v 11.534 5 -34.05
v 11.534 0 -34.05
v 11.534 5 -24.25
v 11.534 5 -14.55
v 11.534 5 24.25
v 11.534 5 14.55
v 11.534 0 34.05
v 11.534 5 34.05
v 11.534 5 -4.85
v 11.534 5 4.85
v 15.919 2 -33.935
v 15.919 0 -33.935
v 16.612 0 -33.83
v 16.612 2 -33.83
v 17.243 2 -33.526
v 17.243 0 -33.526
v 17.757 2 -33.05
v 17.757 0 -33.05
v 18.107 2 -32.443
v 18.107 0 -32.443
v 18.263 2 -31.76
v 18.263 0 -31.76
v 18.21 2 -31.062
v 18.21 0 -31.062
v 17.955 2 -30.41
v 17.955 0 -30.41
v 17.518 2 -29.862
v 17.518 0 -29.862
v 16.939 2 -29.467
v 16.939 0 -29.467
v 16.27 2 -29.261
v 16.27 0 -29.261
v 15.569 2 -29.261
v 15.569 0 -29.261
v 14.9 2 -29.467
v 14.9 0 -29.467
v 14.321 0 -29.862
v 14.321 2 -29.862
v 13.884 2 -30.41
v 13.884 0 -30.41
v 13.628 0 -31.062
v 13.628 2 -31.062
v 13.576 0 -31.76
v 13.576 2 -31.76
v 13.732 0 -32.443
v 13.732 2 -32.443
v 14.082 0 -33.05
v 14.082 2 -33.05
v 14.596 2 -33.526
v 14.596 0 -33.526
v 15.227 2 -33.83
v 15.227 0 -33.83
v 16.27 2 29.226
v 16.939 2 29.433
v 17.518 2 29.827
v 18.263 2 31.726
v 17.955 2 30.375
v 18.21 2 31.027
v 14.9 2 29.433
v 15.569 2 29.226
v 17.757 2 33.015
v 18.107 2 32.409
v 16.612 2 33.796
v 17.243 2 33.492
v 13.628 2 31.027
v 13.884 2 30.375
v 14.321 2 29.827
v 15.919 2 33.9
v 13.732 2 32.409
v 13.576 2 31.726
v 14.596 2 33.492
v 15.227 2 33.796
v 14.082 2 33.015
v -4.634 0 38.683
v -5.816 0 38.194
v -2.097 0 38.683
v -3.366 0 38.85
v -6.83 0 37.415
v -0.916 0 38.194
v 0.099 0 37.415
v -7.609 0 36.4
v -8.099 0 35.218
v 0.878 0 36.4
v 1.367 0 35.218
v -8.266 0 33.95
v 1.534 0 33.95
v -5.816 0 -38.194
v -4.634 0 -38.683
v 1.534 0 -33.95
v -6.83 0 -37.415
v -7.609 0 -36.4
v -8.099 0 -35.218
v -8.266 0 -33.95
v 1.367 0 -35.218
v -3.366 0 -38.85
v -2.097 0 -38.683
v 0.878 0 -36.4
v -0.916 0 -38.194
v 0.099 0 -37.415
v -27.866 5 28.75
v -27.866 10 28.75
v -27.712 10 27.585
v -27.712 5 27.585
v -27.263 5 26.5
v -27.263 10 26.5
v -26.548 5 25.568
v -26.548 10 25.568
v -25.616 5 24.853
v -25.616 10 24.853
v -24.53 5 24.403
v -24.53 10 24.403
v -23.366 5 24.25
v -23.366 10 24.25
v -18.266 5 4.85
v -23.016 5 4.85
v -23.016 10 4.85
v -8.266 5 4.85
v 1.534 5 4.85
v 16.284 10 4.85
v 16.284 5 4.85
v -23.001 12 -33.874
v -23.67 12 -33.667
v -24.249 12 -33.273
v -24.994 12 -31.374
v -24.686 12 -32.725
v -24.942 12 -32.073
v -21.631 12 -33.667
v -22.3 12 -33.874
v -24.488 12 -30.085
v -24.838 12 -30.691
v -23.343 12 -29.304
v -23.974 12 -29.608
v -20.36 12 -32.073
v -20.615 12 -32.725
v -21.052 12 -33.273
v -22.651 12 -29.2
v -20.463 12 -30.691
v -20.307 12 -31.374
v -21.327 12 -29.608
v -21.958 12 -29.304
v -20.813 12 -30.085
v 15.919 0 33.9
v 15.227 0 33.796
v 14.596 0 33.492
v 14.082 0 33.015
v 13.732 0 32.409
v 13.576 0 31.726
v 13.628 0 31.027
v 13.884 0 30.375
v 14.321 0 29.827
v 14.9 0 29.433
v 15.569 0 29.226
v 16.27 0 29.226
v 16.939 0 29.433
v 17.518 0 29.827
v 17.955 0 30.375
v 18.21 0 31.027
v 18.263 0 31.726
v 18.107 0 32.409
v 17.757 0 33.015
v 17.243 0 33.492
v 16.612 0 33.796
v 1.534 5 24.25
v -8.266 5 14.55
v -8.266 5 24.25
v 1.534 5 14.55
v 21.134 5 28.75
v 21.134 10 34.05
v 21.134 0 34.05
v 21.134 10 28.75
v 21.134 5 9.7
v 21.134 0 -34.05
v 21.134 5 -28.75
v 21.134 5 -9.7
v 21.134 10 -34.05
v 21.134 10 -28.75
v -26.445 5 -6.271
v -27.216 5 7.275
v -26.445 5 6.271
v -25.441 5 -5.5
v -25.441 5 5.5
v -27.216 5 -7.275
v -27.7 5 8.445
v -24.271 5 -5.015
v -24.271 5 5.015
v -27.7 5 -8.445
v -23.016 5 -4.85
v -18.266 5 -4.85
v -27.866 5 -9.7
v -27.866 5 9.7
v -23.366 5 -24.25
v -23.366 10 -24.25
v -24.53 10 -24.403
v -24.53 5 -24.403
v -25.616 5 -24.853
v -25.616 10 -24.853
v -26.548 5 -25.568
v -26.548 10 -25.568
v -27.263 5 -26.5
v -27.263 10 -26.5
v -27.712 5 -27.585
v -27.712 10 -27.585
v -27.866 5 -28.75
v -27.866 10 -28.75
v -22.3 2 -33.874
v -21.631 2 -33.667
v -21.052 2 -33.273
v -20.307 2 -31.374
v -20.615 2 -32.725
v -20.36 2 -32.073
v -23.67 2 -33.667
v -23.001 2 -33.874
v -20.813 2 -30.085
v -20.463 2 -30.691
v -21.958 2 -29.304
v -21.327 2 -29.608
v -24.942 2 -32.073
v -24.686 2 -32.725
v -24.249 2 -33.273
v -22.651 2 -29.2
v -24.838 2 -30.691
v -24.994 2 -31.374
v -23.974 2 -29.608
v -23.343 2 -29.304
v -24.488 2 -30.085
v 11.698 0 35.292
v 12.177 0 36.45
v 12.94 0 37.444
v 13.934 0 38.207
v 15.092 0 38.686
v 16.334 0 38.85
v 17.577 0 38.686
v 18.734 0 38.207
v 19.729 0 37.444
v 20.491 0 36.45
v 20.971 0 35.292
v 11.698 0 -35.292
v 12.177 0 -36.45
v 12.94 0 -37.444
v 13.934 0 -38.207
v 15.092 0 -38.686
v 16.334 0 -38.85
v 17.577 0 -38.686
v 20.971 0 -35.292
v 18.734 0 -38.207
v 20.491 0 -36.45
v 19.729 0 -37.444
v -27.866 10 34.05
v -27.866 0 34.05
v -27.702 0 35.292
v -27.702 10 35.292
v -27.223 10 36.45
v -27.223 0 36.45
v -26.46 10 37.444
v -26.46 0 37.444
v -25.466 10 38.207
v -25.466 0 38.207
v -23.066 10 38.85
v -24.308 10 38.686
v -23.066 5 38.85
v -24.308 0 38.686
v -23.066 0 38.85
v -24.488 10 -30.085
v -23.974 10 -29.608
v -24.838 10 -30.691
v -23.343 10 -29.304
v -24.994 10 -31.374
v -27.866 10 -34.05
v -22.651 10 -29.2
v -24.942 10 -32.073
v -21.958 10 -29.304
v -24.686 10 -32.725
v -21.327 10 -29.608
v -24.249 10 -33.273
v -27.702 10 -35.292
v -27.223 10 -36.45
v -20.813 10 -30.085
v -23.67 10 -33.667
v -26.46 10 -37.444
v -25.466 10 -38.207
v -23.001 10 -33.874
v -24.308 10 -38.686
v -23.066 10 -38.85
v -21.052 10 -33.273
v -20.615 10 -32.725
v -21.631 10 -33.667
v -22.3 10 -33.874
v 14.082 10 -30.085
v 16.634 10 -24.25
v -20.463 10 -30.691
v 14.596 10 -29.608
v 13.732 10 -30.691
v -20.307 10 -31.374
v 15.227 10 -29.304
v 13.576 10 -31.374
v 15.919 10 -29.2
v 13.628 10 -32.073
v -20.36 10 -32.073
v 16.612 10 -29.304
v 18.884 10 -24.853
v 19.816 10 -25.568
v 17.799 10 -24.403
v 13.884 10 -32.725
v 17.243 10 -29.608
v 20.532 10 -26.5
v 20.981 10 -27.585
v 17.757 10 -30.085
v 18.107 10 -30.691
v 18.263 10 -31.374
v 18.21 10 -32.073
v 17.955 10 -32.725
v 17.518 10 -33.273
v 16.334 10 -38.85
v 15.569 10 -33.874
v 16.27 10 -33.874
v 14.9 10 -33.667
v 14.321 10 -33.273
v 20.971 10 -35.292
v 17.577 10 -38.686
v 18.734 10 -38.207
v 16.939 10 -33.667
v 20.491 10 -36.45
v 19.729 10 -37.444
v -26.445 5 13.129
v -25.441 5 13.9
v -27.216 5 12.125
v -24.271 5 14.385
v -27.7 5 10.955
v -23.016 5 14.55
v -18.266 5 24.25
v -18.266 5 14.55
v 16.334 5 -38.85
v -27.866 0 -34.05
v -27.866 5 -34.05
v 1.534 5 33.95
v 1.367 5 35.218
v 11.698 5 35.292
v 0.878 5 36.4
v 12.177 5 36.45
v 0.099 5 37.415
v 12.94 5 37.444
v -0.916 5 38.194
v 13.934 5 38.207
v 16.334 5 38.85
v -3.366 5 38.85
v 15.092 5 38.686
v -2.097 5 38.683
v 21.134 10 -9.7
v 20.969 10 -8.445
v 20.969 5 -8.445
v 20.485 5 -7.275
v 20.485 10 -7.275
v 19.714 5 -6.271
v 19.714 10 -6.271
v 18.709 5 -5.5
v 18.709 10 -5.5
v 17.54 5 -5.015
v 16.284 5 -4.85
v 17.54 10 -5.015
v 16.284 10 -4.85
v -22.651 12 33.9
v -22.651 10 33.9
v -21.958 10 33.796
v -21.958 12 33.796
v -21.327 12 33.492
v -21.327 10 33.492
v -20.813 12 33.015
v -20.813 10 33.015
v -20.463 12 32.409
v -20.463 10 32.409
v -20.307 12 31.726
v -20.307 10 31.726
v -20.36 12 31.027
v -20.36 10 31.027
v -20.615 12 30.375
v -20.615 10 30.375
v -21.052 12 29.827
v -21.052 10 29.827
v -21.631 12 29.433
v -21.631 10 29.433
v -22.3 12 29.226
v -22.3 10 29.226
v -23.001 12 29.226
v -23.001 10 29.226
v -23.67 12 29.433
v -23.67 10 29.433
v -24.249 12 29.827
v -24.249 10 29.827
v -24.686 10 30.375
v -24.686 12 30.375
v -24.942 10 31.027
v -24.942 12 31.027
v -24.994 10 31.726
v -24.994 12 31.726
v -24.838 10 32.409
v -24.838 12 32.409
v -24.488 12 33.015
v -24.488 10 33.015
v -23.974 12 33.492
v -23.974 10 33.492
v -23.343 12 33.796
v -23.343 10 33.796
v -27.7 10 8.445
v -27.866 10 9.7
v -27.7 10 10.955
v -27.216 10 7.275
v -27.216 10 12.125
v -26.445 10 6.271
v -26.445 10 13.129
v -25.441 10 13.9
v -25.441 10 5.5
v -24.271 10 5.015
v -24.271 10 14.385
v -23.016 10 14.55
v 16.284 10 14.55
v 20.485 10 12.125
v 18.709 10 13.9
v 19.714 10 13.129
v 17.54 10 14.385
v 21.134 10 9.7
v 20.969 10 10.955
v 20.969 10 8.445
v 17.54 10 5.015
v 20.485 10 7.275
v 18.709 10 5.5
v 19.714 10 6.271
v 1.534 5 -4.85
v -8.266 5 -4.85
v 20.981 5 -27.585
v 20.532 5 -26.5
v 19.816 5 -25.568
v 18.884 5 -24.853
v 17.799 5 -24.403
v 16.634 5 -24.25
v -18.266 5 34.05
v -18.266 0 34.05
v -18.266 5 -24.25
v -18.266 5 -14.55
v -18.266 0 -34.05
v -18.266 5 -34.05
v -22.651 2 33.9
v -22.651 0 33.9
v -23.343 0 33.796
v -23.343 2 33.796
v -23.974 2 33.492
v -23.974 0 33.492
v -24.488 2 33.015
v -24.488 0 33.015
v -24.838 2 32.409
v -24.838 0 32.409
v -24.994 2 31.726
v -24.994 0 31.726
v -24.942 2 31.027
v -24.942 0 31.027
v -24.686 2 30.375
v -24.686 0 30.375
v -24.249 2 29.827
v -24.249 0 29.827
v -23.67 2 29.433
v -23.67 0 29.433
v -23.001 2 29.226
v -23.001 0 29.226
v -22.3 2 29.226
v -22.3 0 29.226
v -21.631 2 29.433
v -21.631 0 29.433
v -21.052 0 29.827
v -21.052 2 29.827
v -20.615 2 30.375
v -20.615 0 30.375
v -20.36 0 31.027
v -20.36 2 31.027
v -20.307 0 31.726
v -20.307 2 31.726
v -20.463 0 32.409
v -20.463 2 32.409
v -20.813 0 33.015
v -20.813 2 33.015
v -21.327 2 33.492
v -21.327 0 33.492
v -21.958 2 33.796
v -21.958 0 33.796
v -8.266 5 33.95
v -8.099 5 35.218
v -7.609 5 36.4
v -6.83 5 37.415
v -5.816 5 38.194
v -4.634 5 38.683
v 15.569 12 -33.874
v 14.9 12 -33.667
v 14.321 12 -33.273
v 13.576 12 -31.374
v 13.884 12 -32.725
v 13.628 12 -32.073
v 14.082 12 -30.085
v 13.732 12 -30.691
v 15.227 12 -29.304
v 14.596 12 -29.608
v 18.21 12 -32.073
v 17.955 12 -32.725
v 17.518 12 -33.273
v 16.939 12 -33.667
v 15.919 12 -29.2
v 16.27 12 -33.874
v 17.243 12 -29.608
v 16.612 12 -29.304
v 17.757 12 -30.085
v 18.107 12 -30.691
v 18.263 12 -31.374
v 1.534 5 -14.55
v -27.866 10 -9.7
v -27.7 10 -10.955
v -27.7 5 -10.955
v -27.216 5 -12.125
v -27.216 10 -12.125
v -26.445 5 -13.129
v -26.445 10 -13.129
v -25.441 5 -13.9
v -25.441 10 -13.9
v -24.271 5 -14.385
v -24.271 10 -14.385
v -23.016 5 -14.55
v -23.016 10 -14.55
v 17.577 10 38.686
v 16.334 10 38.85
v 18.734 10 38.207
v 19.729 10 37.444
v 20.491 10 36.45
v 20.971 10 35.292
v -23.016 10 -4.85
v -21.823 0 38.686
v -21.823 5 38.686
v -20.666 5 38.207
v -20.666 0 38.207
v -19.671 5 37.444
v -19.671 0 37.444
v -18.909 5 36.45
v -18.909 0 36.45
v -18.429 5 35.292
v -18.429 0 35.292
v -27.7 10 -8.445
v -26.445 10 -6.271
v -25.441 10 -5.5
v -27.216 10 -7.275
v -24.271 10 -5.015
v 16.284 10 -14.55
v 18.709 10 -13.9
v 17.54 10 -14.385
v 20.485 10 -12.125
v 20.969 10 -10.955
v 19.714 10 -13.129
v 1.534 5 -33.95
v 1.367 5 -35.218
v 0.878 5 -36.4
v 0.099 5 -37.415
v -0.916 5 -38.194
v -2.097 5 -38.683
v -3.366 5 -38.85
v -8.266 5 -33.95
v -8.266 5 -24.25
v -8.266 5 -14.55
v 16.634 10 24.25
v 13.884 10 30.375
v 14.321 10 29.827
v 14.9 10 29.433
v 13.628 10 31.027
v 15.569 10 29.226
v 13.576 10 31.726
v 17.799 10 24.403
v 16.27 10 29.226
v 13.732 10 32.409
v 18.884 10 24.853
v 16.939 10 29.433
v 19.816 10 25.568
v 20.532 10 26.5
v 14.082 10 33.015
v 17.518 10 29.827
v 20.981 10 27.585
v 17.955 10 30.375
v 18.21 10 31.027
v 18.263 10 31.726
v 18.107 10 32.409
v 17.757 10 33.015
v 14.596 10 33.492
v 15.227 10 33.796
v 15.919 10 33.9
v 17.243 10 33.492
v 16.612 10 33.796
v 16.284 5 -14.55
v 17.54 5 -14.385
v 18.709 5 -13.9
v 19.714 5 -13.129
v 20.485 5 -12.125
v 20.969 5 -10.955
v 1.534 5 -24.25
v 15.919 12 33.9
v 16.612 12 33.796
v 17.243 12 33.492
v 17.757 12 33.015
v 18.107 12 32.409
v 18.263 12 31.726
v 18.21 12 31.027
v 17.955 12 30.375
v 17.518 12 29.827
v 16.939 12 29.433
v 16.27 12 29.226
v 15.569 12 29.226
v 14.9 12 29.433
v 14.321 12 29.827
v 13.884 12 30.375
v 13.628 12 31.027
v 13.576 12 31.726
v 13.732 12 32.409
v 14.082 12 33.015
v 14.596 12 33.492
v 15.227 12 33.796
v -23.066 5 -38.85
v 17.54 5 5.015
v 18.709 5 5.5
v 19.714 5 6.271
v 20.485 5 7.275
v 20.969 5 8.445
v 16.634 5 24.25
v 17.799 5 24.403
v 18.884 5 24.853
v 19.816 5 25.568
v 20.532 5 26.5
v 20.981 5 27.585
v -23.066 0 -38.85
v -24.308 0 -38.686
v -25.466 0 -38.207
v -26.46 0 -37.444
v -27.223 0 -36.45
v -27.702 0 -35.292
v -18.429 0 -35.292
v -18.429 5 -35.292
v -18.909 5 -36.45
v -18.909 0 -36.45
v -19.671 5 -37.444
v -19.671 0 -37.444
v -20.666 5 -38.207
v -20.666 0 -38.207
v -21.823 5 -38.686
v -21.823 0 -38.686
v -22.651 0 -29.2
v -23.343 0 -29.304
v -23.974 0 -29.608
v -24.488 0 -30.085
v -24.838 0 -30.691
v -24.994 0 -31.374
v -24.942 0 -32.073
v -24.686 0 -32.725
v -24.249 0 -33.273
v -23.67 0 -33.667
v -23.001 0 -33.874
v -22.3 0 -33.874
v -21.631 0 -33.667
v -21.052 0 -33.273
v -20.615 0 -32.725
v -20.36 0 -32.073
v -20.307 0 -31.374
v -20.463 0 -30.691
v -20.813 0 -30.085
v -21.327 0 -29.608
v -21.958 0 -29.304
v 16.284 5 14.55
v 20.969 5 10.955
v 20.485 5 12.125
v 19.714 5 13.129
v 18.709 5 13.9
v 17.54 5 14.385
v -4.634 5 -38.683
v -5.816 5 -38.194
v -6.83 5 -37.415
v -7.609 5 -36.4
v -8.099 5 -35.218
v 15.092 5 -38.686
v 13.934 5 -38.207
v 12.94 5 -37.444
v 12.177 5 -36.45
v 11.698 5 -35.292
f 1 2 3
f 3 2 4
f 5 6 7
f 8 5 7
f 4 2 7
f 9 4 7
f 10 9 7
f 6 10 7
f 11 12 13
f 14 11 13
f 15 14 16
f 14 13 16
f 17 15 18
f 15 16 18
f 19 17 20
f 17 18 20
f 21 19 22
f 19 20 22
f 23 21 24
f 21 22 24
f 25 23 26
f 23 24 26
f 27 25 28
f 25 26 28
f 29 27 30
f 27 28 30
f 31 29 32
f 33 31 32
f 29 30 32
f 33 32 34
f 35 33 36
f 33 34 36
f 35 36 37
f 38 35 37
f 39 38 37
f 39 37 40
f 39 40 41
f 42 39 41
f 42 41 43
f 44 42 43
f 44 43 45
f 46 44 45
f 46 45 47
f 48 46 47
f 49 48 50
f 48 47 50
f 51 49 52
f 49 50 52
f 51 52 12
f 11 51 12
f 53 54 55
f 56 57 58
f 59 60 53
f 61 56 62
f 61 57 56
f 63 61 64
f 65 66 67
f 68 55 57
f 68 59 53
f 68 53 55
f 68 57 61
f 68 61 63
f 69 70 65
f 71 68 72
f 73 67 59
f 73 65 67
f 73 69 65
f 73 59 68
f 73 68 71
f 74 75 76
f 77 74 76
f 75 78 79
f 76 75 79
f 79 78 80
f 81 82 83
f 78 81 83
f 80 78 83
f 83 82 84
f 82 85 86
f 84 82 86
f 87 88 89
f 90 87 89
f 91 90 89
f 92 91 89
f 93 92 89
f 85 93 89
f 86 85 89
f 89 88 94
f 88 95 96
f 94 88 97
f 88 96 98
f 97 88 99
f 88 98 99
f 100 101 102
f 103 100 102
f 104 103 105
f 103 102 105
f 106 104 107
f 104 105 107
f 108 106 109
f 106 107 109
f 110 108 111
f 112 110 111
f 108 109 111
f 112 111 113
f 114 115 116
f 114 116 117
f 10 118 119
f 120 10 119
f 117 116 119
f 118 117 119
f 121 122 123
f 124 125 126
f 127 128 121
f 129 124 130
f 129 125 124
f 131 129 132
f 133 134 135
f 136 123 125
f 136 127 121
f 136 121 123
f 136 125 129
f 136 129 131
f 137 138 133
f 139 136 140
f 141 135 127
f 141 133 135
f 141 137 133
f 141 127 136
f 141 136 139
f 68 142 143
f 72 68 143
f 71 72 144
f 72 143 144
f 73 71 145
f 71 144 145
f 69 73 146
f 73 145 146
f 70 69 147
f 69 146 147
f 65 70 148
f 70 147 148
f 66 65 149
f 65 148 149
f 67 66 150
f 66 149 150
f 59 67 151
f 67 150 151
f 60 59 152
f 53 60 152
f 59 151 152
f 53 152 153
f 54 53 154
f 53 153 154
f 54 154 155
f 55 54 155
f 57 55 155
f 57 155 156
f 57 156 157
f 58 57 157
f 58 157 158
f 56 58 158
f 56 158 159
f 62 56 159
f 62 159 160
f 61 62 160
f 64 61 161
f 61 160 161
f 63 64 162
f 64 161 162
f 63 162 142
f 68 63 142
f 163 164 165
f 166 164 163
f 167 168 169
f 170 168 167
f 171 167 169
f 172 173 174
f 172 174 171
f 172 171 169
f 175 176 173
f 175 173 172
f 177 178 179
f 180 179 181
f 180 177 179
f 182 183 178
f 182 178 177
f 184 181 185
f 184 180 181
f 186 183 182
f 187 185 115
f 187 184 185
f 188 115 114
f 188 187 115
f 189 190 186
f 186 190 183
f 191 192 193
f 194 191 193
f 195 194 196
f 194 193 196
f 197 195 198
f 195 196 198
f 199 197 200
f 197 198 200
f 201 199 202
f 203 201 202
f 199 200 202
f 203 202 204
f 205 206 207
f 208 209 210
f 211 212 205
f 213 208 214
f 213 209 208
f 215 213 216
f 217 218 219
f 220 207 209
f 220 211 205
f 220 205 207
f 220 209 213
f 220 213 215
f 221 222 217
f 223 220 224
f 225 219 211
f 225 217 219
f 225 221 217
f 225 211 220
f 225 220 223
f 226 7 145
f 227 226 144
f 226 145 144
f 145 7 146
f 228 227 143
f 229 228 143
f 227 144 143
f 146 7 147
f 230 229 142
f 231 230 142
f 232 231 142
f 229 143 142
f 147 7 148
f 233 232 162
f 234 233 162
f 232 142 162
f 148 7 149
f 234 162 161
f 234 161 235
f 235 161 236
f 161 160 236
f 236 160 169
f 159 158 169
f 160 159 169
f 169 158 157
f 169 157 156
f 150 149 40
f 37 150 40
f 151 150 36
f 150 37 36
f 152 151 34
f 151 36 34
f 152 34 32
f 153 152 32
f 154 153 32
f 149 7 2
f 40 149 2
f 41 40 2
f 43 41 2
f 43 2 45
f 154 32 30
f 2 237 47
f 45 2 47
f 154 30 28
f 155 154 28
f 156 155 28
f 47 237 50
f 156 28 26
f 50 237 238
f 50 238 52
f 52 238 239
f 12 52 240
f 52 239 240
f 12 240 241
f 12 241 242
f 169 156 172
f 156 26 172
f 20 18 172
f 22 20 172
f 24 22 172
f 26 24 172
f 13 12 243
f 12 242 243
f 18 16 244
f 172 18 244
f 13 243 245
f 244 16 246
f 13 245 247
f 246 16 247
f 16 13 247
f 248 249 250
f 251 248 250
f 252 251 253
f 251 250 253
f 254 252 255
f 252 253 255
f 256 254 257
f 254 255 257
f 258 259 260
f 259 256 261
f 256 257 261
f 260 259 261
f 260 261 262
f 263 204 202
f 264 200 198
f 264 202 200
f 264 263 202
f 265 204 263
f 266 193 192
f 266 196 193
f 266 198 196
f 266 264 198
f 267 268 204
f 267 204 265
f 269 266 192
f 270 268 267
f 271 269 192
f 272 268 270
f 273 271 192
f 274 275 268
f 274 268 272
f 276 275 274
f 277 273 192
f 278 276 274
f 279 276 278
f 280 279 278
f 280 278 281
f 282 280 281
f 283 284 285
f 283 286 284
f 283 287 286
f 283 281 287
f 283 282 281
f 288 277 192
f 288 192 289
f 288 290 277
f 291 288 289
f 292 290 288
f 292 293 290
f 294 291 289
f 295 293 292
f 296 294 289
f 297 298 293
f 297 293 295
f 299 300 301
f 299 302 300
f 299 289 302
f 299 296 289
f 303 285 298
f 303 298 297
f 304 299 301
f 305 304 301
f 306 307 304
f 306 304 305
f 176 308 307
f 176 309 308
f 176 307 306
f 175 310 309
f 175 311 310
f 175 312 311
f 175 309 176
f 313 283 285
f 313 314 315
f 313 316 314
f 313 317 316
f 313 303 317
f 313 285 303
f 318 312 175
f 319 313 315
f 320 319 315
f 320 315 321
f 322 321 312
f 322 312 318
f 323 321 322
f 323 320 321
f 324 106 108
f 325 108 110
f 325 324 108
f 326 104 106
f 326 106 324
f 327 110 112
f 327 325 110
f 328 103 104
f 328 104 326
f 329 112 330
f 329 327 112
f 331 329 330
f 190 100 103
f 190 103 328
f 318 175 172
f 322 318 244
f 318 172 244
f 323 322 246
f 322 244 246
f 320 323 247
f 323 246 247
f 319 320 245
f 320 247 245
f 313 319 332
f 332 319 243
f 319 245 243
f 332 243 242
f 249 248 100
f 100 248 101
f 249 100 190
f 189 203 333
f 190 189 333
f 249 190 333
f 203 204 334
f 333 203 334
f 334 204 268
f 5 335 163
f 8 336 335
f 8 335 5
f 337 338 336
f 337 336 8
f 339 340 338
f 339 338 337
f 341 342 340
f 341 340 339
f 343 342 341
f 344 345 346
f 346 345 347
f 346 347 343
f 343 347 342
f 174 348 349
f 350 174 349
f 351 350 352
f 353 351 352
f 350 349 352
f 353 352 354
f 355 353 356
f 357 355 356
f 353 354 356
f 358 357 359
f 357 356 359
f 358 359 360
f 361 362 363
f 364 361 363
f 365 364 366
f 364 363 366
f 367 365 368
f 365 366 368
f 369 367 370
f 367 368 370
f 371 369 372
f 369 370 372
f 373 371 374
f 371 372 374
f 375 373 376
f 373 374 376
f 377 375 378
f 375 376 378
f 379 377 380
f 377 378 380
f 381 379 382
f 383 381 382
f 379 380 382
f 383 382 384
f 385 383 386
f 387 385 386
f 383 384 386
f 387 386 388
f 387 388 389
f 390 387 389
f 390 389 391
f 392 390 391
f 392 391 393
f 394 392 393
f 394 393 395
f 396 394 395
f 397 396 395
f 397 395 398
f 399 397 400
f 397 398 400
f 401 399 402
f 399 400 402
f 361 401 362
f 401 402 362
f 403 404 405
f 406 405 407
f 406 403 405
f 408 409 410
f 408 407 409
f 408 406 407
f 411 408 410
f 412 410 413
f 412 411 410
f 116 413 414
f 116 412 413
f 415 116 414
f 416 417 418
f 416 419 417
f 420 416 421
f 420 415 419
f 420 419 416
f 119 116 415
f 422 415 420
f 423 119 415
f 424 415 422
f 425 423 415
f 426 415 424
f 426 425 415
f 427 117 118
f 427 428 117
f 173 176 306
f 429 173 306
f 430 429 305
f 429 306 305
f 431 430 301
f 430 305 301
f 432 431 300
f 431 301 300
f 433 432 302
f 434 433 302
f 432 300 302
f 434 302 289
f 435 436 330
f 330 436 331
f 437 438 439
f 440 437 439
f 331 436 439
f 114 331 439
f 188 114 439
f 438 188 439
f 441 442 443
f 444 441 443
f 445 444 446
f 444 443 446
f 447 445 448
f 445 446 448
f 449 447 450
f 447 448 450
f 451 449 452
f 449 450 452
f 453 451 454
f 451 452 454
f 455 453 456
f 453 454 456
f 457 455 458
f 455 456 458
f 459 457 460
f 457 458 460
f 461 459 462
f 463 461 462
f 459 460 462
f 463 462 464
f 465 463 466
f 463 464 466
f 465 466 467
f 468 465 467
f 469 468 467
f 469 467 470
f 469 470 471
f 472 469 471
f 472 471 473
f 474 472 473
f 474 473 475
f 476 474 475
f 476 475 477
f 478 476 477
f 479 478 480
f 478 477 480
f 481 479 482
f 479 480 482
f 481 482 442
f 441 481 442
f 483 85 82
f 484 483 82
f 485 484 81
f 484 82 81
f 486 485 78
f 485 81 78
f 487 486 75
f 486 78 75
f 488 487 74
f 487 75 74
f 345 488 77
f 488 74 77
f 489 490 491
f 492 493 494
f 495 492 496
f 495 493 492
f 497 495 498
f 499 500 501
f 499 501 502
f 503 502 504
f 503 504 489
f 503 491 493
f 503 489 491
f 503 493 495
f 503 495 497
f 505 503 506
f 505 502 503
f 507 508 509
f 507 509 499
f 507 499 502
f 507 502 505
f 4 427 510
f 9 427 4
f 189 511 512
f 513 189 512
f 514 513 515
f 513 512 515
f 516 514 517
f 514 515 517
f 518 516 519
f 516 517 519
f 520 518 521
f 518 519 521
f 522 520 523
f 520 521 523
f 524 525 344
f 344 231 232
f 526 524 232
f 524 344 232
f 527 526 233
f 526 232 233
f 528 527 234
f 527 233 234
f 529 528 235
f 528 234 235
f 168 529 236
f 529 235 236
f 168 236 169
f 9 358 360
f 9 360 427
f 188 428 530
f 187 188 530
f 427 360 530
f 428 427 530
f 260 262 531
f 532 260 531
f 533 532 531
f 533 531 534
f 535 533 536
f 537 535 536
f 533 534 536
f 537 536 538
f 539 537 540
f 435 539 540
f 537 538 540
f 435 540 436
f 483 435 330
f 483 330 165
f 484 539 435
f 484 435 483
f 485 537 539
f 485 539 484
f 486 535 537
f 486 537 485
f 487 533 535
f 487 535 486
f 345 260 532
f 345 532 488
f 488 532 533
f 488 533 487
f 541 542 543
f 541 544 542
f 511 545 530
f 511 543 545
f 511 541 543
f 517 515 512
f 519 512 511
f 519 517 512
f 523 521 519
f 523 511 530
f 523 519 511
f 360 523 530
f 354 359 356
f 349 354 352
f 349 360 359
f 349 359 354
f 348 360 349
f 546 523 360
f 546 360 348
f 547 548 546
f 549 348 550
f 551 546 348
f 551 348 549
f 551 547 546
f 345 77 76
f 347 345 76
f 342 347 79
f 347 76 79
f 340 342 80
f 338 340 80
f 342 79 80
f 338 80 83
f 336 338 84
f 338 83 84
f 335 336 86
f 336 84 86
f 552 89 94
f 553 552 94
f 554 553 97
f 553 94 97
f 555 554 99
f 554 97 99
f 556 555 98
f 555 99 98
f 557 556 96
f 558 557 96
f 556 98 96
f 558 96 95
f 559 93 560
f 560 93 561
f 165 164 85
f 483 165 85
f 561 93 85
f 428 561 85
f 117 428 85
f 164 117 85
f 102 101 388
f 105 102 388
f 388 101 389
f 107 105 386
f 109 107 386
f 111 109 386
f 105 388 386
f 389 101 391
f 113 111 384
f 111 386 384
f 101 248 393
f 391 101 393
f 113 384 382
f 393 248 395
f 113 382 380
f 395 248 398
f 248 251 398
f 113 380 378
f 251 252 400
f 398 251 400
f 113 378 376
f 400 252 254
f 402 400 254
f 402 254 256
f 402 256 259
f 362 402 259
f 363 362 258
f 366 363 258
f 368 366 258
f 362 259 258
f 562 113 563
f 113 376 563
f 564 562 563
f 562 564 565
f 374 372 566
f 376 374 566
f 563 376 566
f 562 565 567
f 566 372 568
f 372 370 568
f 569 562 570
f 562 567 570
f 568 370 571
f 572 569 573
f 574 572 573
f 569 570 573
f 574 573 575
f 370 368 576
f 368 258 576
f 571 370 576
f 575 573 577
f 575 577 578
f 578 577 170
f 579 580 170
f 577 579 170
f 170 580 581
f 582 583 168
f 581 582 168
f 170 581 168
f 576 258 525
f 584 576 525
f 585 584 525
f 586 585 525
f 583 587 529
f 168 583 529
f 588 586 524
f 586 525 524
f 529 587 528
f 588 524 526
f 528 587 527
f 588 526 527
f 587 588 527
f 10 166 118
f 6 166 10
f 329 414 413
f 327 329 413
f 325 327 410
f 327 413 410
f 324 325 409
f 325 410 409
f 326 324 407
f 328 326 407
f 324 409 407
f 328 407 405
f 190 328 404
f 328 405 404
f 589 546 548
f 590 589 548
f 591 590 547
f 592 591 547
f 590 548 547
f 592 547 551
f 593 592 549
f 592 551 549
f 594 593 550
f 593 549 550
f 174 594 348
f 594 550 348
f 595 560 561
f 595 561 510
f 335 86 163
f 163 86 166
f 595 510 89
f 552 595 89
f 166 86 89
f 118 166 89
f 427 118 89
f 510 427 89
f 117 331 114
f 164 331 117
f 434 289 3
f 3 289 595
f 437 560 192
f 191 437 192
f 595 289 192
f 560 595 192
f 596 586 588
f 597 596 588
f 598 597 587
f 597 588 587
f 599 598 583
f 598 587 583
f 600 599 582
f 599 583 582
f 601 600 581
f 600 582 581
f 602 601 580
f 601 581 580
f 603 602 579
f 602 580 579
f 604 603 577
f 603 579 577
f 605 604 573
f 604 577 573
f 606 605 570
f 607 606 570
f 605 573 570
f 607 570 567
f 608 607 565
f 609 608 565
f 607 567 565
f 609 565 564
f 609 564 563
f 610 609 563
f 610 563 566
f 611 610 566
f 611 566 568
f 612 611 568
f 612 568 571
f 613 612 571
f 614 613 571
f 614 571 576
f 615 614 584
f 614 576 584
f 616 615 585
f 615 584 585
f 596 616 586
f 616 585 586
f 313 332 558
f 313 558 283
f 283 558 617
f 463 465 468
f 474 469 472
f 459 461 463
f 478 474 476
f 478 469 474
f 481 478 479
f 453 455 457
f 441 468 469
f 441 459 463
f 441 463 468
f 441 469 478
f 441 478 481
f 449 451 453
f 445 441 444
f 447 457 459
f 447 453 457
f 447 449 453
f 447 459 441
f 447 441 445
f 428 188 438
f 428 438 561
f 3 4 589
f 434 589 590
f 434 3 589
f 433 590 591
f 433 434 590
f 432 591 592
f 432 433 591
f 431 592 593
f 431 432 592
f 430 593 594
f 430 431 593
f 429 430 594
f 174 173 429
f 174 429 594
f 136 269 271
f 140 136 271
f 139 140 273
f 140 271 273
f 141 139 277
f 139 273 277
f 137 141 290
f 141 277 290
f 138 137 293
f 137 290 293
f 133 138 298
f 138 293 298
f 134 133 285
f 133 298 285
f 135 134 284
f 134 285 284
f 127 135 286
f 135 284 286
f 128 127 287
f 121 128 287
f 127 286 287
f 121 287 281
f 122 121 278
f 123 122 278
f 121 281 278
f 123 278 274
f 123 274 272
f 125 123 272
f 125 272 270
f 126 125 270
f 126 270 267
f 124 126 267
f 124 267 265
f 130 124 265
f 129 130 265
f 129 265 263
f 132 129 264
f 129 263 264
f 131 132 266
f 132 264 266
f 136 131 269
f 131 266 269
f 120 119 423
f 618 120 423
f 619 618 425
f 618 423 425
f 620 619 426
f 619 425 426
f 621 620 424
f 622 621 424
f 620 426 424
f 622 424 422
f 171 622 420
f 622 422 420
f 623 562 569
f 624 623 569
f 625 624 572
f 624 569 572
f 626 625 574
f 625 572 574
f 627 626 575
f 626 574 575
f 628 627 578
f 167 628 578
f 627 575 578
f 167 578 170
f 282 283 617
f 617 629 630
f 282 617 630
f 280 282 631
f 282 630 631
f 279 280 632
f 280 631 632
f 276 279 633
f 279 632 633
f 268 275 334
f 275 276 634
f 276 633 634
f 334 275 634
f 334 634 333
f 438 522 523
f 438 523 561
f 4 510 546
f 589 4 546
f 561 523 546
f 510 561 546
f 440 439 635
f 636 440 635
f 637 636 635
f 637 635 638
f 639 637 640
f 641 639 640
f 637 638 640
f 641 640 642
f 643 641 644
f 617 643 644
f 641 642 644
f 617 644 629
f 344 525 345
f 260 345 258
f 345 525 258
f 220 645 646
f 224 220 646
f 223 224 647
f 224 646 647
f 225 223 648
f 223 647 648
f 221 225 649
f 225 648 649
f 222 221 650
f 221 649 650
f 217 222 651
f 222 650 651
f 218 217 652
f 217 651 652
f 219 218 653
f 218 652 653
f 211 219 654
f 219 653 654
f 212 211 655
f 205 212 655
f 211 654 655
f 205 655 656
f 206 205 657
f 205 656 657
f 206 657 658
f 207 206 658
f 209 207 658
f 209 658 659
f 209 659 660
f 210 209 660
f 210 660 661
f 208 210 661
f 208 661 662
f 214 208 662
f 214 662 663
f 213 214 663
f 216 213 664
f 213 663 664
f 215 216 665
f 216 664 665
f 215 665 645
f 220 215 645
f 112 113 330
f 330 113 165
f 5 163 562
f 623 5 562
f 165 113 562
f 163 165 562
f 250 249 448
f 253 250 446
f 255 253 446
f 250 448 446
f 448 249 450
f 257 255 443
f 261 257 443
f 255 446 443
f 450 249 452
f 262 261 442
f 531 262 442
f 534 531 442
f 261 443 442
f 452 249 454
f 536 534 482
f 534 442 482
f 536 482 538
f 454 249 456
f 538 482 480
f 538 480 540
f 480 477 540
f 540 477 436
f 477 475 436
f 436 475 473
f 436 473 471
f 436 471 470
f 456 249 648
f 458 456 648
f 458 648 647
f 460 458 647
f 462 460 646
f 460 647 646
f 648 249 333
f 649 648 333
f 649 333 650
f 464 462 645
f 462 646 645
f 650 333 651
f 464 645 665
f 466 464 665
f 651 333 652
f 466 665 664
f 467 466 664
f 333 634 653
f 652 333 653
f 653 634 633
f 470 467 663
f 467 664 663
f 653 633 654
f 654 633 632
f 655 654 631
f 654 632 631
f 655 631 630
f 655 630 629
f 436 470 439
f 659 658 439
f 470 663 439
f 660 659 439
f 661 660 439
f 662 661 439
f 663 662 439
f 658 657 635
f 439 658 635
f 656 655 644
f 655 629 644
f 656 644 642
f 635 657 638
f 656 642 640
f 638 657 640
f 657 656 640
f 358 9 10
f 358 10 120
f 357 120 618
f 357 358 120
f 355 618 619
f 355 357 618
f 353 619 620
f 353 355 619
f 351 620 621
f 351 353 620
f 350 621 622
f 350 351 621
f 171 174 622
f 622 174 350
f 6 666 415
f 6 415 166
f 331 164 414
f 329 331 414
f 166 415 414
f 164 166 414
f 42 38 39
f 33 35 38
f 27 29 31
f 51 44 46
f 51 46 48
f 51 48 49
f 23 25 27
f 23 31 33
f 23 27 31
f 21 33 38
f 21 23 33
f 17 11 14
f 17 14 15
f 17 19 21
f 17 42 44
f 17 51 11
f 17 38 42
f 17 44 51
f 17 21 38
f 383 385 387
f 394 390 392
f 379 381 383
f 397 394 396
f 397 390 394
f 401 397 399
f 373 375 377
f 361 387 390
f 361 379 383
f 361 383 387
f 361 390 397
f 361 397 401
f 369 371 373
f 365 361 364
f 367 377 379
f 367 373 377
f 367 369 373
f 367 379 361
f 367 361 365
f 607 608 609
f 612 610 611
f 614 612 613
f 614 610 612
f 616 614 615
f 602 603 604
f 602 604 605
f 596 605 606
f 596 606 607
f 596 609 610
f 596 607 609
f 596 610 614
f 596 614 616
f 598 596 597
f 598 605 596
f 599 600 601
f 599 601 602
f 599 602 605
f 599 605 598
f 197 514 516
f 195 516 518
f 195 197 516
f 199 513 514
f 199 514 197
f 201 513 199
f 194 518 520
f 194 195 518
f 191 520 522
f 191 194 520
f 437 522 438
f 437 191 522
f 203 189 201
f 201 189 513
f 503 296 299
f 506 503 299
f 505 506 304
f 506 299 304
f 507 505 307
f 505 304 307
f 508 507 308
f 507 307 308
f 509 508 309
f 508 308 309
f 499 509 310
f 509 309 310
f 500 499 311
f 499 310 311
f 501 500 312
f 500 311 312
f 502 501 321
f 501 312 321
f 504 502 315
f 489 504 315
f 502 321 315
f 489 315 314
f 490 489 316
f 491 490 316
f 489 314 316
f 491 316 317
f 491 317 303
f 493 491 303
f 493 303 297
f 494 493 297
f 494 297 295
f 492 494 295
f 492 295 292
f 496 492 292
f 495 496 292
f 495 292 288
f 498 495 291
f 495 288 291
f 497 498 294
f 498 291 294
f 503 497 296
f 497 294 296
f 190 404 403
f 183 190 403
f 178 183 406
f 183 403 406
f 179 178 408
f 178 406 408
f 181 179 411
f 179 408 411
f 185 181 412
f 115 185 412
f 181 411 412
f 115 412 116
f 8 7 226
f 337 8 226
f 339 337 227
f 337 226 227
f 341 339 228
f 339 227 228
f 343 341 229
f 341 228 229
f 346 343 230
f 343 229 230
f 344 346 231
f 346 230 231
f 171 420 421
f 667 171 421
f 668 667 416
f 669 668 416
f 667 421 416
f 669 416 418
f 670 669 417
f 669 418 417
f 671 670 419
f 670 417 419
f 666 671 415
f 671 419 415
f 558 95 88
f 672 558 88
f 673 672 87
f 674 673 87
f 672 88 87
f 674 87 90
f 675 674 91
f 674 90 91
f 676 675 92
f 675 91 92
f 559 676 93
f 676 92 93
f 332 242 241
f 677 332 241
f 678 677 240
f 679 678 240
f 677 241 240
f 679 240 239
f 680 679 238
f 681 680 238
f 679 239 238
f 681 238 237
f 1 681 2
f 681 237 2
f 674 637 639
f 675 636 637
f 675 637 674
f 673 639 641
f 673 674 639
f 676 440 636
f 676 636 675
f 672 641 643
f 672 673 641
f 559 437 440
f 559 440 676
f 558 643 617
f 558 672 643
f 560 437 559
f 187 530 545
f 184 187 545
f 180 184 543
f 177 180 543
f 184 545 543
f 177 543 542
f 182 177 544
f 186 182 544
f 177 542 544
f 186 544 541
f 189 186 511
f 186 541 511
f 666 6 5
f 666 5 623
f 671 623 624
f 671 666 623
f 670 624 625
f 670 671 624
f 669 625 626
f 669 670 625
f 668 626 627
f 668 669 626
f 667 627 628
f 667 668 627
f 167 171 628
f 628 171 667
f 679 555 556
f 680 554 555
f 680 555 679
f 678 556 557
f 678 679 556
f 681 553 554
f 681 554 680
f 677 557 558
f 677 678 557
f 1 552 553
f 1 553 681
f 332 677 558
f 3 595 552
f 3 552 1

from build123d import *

# Parameters (mm, degrees)
BOSS_EXTRUDE1_DEPTH      = 10
CUT_EXTRUDE3_DEPTH       = 5
BOSS_EXTRUDE6_DEPTH      = 5
BOSS_EXTRUDE6_DEPTH_BACK = 10
SKETCH5_W                = 4.5
SKETCH5_H                = 5
CUT_EXTRUDE5_DEPTH       = 60
CUT_EXTRUDE7_DEPTH       = 5
CUT_EXTRUDE9_DEPTH       = 14
SKETCH9_R                = 2.35
BOSS_EXTRUDE7_DEPTH      = 2
SKETCH12_R               = 2.35
CUT_EXTRUDE10_DEPTH      = 2


with BuildPart() as part:
    # Sketch1 → Boss-Extrude1 (new body)
    with BuildSketch(Plane(origin=(0, 0, 0), x_dir=(1, 0, 0), z_dir=(0, 1, 0))):
        with BuildLine():
            Line((-23.3656, -38.85), (16.6344, -38.85))
            ThreePointArc((16.6344, -38.85), (19.816380515, -37.531980515), (21.1344, -34.35))
            Line((21.1344, -34.35), (21.1344, 34.35))
            ThreePointArc((21.1344, 34.35), (19.816380515, 37.531980515), (16.6344, 38.85))
            Line((16.6344, 38.85), (-23.3656, 38.85))
            ThreePointArc((-23.3656, 38.85), (-26.547580515, 37.531980515), (-27.8656, 34.35))
            Line((-27.8656, 34.35), (-27.8656, -34.35))
            ThreePointArc((-27.8656, -34.35), (-26.547580515, -37.531980515), (-23.3656, -38.85))
        make_face()
    extrude(amount=BOSS_EXTRUDE1_DEPTH)

    # Sketch2 → Cut-Extrude3 (cut)
    with BuildSketch(Plane(origin=(0, 10, 0), x_dir=(1, 0, 0), z_dir=(0, 1, 0))):
        with BuildLine():
            Line((-23.0156, -14.55), (-27.8656, -14.55))
            Line((-27.8656, -14.55), (-27.8656, -28.75))
            ThreePointArc((-27.8656, -28.75), (-26.547580515, -25.568019485), (-23.3656, -24.25))
            Line((-23.3656, -24.25), (16.6344, -24.25))
            ThreePointArc((16.6344, -24.25), (19.816380515, -25.568019485), (21.1344, -28.75))
            Line((21.1344, -28.75), (21.1344, -14.55))
            Line((21.1344, -14.55), (16.2844, -14.55))
            Line((16.2844, -14.55), (-23.0156, -14.55))
        make_face()
        with BuildLine():
            ThreePointArc((-23.0156, -14.55), (-26.445067903, -13.129467874), (-27.8656, -9.699999958))
            Line((-27.8656, -9.699999958), (-27.8656, -14.55))
            Line((-27.8656, -14.55), (-23.0156, -14.55))
        make_face()
        with BuildLine():
            Line((21.1344, -14.55), (21.1344, -9.7))
            ThreePointArc((21.1344, -9.7), (19.713867889, -13.129467889), (16.2844, -14.55))
            Line((16.2844, -14.55), (21.1344, -14.55))
        make_face()
        with BuildLine():
            Line((21.1344, -9.7), (21.1344, -4.85))
            Line((21.1344, -4.85), (16.28440001, -4.85))
            ThreePointArc((16.28440001, -4.85), (19.713867892, -6.270532115), (21.1344, -9.7))
        make_face()
        with BuildLine():
            Line((-23.0156, -4.85), (-27.8656, -4.85))
            Line((-27.8656, -4.85), (-27.8656, -9.699999958))
            ThreePointArc((-27.8656, -9.699999958), (-26.445067874, -6.270532097), (-23.0156, -4.85))
        make_face()
        Polygon((-23.0156, 4.85), (-27.8656, 4.85), (-27.8656, -4.85), (-23.0156, -4.85), (16.28440001, -4.85), (21.1344, -4.85), (21.1344, 4.85), (16.284399974, 4.85), align=None)
        with BuildLine():
            ThreePointArc((-23.0156, 4.85), (-26.445067902, 6.270532124), (-27.8656, 9.700000036))
            Line((-27.8656, 9.700000036), (-27.8656, 4.85))
            Line((-27.8656, 4.85), (-23.0156, 4.85))
        make_face()
        with BuildLine():
            Line((21.1344, 4.85), (21.1344, 9.7))
            ThreePointArc((21.1344, 9.7), (19.71386788, 6.270532102), (16.284399974, 4.85))
            Line((16.284399974, 4.85), (21.1344, 4.85))
        make_face()
        with BuildLine():
            Line((-23.015600011, 14.55), (-27.8656, 14.55))
            Line((-27.8656, 14.55), (-27.8656, 9.700000036))
            ThreePointArc((-27.8656, 9.700000036), (-26.44506788, 13.129467898), (-23.015600011, 14.55))
        make_face()
        with BuildLine():
            Line((16.6344, 24.25), (-23.3656, 24.25))
            ThreePointArc((-23.3656, 24.25), (-26.547580515, 25.568019485), (-27.8656, 28.75))
            Line((-27.8656, 28.75), (-27.8656, 14.55))
            Line((-27.8656, 14.55), (-23.015600011, 14.55))
            Line((-23.015600011, 14.55), (16.2844, 14.55))
            Line((16.2844, 14.55), (21.1344, 14.55))
            Line((21.1344, 14.55), (21.1344, 28.75))
            ThreePointArc((21.1344, 28.75), (19.816380515, 25.568019485), (16.6344, 24.25))
        make_face()
        with BuildLine():
            Line((21.1344, 9.7), (21.1344, 14.55))
            Line((21.1344, 14.55), (16.2844, 14.55))
            ThreePointArc((16.2844, 14.55), (19.713867889, 13.129467889), (21.1344, 9.7))
        make_face()
    extrude(amount=-CUT_EXTRUDE3_DEPTH, mode=Mode.SUBTRACT)

    # Sketch4 → Boss-Extrude6 (add, two sides: drawn at the far end of the back side and taken through both)
    with BuildSketch(Plane.XZ.offset(-BOSS_EXTRUDE6_DEPTH_BACK)):
        with BuildLine():
            ThreePointArc((-27.8656, 34.35), (-26.547580515, 37.531980515), (-23.3656, 38.85))
            Line((-23.3656, 38.85), (-27.8656, 38.85))
            Line((-27.8656, 38.85), (-27.8656, 34.35))
        make_face()
        with BuildLine():
            Line((-23.3656, 35.615611346), (-23.3656, 38.85))
            ThreePointArc((-23.3656, 38.85), (-26.547580515, 37.531980515), (-27.8656, 34.35))
            Line((-27.8656, 34.35), (-27.8656, 34.176611106))
            Line((-27.8656, 34.176611106), (-23.3656, 35.615611346))
        make_face()
        with BuildLine():
            Line((17.428758808, 36.847416441), (16.6344, 38.85))
            ThreePointArc((16.6344, 38.85), (19.816380515, 37.531980515), (21.1344, 34.35))
            Line((21.1344, 34.35), (17.428758808, 36.847416441))
        make_face()
        with BuildLine():
            Line((21.1344, 38.85), (21.1344, 34.35))
            ThreePointArc((21.1344, 34.35), (19.816380515, 37.531980515), (16.6344, 38.85))
            Line((16.6344, 38.85), (21.1344, 38.85))
        make_face()
        with BuildLine():
            Line((16.6344, -34.745010915), (21.1344, -34.35))
            ThreePointArc((21.1344, -34.35), (19.816380515, -37.531980515), (16.6344, -38.85))
            Line((16.6344, -38.85), (16.6344, -34.745010915))
        make_face()
        with BuildLine():
            Line((16.6344, -38.85), (21.1344, -38.85))
            Line((21.1344, -38.85), (21.1344, -34.35))
            ThreePointArc((21.1344, -34.35), (19.816380515, -37.531980515), (16.6344, -38.85))
        make_face()
        with BuildLine():
            Line((-23.3656, -38.85), (-23.156696732, -35.585785164))
            Line((-23.156696732, -35.585785164), (-27.8656, -34.35))
            ThreePointArc((-27.8656, -34.35), (-26.547580515, -37.531980515), (-23.3656, -38.85))
        make_face()
        with BuildLine():
            Line((-27.8656, -34.35), (-27.8656, -38.85))
            Line((-27.8656, -38.85), (-23.3656, -38.85))
            ThreePointArc((-23.3656, -38.85), (-26.547580515, -37.531980515), (-27.8656, -34.35))
        make_face()
    extrude(amount=BOSS_EXTRUDE6_DEPTH + BOSS_EXTRUDE6_DEPTH_BACK)

    # Sketch5 → Cut-Extrude5 (cut)
    with BuildSketch(Plane(origin=(21.1344, 0, 0), x_dir=(0, 0, -1), z_dir=(1, 0, 0))):
        Polygon((34.35, 0), (-34.35, 0), (-34.35, -5), (-38.85, -5), (-38.85, -11.467862175), (41.584838498, -11.467862175), (41.584838498, 0), (38.85, 0), (38.85, -5), (34.35, -5), align=None)
        with Locations((36.6, -2.5)):
            Rectangle(SKETCH5_W, SKETCH5_H)
        with Locations((-36.6, -2.5)):
            Rectangle(SKETCH5_W, SKETCH5_H)
    extrude(amount=-CUT_EXTRUDE5_DEPTH, mode=Mode.SUBTRACT)

    # Sketch6 → Cut-Extrude7 (cut)
    with BuildSketch(Plane.XZ):
        with BuildLine():
            ThreePointArc((-27.8656, 34.05), (-26.45971255, 37.44411255), (-23.0656, 38.85))
            Line((-23.0656, 38.85), (-27.8656, 38.85))
            Line((-27.8656, 38.85), (-27.8656, 34.05))
        make_face()
        with BuildLine():
            Line((-18.2656, 34.05), (-18.2656, 38.85))
            Line((-18.2656, 38.85), (-23.0656, 38.85))
            ThreePointArc((-23.0656, 38.85), (-19.67148745, 37.44411255), (-18.2656, 34.05))
        make_face()
        Polygon((-8.2656, 38.85), (-18.2656, 38.85), (-18.2656, 34.05), (-18.2656, -34.05), (-18.2656, -38.85), (-8.2656, -38.85), (-8.2656, -33.950000026), (-8.2656, 33.95), align=None)
        with BuildLine():
            Line((-3.365599985, 38.85), (-8.2656, 38.85))
            Line((-8.2656, 38.85), (-8.2656, 33.95))
            ThreePointArc((-8.2656, 33.95), (-6.830423222, 37.414823233), (-3.365599985, 38.85))
        make_face()
        with BuildLine():
            Line((1.5344, 38.85), (-3.365599985, 38.85))
            ThreePointArc((-3.365599985, 38.85), (0.099223233, 37.414823222), (1.5344, 33.95))
            Line((1.5344, 33.95), (1.5344, 38.85))
        make_face()
        Polygon((1.5344, 38.85), (1.5344, 33.95), (1.5344, -33.95), (1.5344, -38.85), (11.5344, -38.85), (11.5344, -34.050000018), (11.5344, 34.05), (11.5344, 38.85), align=None)
        with BuildLine():
            Line((16.3344, 38.85), (11.5344, 38.85))
            Line((11.5344, 38.85), (11.5344, 34.05))
            ThreePointArc((11.5344, 34.05), (12.94028745, 37.44411255), (16.3344, 38.85))
        make_face()
        with BuildLine():
            Line((21.1344, 38.85), (16.3344, 38.85))
            ThreePointArc((16.3344, 38.85), (19.72851255, 37.44411255), (21.1344, 34.05))
            Line((21.1344, 34.05), (21.1344, 38.85))
        make_face()
        with BuildLine():
            ThreePointArc((21.1344, -34.05), (19.72851255, -37.44411255), (16.3344, -38.85))
            Line((16.3344, -38.85), (21.1344, -38.85))
            Line((21.1344, -38.85), (21.1344, -34.05))
        make_face()
        with BuildLine():
            Line((11.5344, -34.050000018), (11.5344, -38.85))
            Line((11.5344, -38.85), (16.3344, -38.85))
            ThreePointArc((16.3344, -38.85), (12.940287457, -37.444112556), (11.5344, -34.050000018))
        make_face()
        with BuildLine():
            Line((1.5344, -38.85), (1.5344, -33.95))
            ThreePointArc((1.5344, -33.95), (0.099223245, -37.414823211), (-3.365599951, -38.85))
            Line((-3.365599951, -38.85), (1.5344, -38.85))
        make_face()
        with BuildLine():
            ThreePointArc((-3.365599951, -38.85), (-6.830423201, -37.414823254), (-8.2656, -33.950000026))
            Line((-8.2656, -33.950000026), (-8.2656, -38.85))
            Line((-8.2656, -38.85), (-3.365599951, -38.85))
        make_face()
        with BuildLine():
            Line((-18.2656, -38.85), (-18.2656, -34.05))
            ThreePointArc((-18.2656, -34.05), (-19.67148745, -37.44411255), (-23.0656, -38.85))
            Line((-23.0656, -38.85), (-18.2656, -38.85))
        make_face()
        with BuildLine():
            ThreePointArc((-23.0656, -38.85), (-26.459712556, -37.444112543), (-27.8656, -34.049999982))
            Line((-27.8656, -34.049999982), (-27.8656, -38.85))
            Line((-27.8656, -38.85), (-23.0656, -38.85))
        make_face()
    extrude(amount=-CUT_EXTRUDE7_DEPTH, mode=Mode.SUBTRACT)

    # Sketch8 → Cut-Extrude9 (cut)
    with BuildSketch(Plane.XZ):
        with BuildLine():
            Line((-27.8656, 38.85), (-27.8656, 34.05))
            ThreePointArc((-27.8656, 34.05), (-26.45971255, 37.44411255), (-23.0656, 38.85))
            Line((-23.0656, 38.85), (-27.8656, 38.85))
        make_face()
        with BuildLine():
            Line((21.1344, 34.05), (21.1344, 38.85))
            Line((21.1344, 38.85), (16.3344, 38.85))
            ThreePointArc((16.3344, 38.85), (19.72851255, 37.44411255), (21.1344, 34.05))
        make_face()
        with BuildLine():
            Line((16.3344, -38.85), (21.1344, -38.85))
            Line((21.1344, -38.85), (21.1344, -34.05))
            ThreePointArc((21.1344, -34.05), (19.72851255, -37.44411255), (16.3344, -38.85))
        make_face()
        with BuildLine():
            Line((-27.8656, -34.05), (-27.8656, -38.85))
            Line((-27.8656, -38.85), (-23.0656, -38.85))
            ThreePointArc((-23.0656, -38.85), (-26.45971255, -37.44411255), (-27.8656, -34.05))
        make_face()
    extrude(amount=-CUT_EXTRUDE9_DEPTH, mode=Mode.SUBTRACT)

    # Sketch9 → Boss-Extrude7 (add)
    with BuildSketch(Plane(origin=(0, 10, 0), x_dir=(1, 0, 0), z_dir=(0, 1, 0))):
        with Locations(Location((-22.6506, 31.55, 0), (0, 0, 270))):
            Circle(SKETCH9_R)
        with Locations(Location((15.9194, 31.55, 0), (0, 0, 270))):
            Circle(SKETCH9_R)
        with Locations(Location((-22.6506, -31.55, 0), (0, 0, 270))):
            Circle(SKETCH9_R)
        with Locations(Location((15.9194, -31.55, 0), (0, 0, 270))):
            Circle(SKETCH9_R)
    extrude(amount=BOSS_EXTRUDE7_DEPTH)

    # Sketch12 → Cut-Extrude10 (cut)
    with BuildSketch(Plane.XZ):
        with Locations(Location((15.9194, 31.55, 0), (0, 0, 90))):
            Circle(SKETCH12_R)
        with Locations(Location((-22.6506, -31.55, 0), (0, 0, 90))):
            Circle(SKETCH12_R)
        with Locations(Location((-22.6506, 31.55, 0), (0, 0, 90))):
            Circle(SKETCH12_R)
        with Locations(Location((15.9194, -31.584685618, 0), (0, 0, 270))):
            Circle(SKETCH12_R)
    extrude(amount=-CUT_EXTRUDE10_DEPTH, mode=Mode.SUBTRACT)


solid = part.part
